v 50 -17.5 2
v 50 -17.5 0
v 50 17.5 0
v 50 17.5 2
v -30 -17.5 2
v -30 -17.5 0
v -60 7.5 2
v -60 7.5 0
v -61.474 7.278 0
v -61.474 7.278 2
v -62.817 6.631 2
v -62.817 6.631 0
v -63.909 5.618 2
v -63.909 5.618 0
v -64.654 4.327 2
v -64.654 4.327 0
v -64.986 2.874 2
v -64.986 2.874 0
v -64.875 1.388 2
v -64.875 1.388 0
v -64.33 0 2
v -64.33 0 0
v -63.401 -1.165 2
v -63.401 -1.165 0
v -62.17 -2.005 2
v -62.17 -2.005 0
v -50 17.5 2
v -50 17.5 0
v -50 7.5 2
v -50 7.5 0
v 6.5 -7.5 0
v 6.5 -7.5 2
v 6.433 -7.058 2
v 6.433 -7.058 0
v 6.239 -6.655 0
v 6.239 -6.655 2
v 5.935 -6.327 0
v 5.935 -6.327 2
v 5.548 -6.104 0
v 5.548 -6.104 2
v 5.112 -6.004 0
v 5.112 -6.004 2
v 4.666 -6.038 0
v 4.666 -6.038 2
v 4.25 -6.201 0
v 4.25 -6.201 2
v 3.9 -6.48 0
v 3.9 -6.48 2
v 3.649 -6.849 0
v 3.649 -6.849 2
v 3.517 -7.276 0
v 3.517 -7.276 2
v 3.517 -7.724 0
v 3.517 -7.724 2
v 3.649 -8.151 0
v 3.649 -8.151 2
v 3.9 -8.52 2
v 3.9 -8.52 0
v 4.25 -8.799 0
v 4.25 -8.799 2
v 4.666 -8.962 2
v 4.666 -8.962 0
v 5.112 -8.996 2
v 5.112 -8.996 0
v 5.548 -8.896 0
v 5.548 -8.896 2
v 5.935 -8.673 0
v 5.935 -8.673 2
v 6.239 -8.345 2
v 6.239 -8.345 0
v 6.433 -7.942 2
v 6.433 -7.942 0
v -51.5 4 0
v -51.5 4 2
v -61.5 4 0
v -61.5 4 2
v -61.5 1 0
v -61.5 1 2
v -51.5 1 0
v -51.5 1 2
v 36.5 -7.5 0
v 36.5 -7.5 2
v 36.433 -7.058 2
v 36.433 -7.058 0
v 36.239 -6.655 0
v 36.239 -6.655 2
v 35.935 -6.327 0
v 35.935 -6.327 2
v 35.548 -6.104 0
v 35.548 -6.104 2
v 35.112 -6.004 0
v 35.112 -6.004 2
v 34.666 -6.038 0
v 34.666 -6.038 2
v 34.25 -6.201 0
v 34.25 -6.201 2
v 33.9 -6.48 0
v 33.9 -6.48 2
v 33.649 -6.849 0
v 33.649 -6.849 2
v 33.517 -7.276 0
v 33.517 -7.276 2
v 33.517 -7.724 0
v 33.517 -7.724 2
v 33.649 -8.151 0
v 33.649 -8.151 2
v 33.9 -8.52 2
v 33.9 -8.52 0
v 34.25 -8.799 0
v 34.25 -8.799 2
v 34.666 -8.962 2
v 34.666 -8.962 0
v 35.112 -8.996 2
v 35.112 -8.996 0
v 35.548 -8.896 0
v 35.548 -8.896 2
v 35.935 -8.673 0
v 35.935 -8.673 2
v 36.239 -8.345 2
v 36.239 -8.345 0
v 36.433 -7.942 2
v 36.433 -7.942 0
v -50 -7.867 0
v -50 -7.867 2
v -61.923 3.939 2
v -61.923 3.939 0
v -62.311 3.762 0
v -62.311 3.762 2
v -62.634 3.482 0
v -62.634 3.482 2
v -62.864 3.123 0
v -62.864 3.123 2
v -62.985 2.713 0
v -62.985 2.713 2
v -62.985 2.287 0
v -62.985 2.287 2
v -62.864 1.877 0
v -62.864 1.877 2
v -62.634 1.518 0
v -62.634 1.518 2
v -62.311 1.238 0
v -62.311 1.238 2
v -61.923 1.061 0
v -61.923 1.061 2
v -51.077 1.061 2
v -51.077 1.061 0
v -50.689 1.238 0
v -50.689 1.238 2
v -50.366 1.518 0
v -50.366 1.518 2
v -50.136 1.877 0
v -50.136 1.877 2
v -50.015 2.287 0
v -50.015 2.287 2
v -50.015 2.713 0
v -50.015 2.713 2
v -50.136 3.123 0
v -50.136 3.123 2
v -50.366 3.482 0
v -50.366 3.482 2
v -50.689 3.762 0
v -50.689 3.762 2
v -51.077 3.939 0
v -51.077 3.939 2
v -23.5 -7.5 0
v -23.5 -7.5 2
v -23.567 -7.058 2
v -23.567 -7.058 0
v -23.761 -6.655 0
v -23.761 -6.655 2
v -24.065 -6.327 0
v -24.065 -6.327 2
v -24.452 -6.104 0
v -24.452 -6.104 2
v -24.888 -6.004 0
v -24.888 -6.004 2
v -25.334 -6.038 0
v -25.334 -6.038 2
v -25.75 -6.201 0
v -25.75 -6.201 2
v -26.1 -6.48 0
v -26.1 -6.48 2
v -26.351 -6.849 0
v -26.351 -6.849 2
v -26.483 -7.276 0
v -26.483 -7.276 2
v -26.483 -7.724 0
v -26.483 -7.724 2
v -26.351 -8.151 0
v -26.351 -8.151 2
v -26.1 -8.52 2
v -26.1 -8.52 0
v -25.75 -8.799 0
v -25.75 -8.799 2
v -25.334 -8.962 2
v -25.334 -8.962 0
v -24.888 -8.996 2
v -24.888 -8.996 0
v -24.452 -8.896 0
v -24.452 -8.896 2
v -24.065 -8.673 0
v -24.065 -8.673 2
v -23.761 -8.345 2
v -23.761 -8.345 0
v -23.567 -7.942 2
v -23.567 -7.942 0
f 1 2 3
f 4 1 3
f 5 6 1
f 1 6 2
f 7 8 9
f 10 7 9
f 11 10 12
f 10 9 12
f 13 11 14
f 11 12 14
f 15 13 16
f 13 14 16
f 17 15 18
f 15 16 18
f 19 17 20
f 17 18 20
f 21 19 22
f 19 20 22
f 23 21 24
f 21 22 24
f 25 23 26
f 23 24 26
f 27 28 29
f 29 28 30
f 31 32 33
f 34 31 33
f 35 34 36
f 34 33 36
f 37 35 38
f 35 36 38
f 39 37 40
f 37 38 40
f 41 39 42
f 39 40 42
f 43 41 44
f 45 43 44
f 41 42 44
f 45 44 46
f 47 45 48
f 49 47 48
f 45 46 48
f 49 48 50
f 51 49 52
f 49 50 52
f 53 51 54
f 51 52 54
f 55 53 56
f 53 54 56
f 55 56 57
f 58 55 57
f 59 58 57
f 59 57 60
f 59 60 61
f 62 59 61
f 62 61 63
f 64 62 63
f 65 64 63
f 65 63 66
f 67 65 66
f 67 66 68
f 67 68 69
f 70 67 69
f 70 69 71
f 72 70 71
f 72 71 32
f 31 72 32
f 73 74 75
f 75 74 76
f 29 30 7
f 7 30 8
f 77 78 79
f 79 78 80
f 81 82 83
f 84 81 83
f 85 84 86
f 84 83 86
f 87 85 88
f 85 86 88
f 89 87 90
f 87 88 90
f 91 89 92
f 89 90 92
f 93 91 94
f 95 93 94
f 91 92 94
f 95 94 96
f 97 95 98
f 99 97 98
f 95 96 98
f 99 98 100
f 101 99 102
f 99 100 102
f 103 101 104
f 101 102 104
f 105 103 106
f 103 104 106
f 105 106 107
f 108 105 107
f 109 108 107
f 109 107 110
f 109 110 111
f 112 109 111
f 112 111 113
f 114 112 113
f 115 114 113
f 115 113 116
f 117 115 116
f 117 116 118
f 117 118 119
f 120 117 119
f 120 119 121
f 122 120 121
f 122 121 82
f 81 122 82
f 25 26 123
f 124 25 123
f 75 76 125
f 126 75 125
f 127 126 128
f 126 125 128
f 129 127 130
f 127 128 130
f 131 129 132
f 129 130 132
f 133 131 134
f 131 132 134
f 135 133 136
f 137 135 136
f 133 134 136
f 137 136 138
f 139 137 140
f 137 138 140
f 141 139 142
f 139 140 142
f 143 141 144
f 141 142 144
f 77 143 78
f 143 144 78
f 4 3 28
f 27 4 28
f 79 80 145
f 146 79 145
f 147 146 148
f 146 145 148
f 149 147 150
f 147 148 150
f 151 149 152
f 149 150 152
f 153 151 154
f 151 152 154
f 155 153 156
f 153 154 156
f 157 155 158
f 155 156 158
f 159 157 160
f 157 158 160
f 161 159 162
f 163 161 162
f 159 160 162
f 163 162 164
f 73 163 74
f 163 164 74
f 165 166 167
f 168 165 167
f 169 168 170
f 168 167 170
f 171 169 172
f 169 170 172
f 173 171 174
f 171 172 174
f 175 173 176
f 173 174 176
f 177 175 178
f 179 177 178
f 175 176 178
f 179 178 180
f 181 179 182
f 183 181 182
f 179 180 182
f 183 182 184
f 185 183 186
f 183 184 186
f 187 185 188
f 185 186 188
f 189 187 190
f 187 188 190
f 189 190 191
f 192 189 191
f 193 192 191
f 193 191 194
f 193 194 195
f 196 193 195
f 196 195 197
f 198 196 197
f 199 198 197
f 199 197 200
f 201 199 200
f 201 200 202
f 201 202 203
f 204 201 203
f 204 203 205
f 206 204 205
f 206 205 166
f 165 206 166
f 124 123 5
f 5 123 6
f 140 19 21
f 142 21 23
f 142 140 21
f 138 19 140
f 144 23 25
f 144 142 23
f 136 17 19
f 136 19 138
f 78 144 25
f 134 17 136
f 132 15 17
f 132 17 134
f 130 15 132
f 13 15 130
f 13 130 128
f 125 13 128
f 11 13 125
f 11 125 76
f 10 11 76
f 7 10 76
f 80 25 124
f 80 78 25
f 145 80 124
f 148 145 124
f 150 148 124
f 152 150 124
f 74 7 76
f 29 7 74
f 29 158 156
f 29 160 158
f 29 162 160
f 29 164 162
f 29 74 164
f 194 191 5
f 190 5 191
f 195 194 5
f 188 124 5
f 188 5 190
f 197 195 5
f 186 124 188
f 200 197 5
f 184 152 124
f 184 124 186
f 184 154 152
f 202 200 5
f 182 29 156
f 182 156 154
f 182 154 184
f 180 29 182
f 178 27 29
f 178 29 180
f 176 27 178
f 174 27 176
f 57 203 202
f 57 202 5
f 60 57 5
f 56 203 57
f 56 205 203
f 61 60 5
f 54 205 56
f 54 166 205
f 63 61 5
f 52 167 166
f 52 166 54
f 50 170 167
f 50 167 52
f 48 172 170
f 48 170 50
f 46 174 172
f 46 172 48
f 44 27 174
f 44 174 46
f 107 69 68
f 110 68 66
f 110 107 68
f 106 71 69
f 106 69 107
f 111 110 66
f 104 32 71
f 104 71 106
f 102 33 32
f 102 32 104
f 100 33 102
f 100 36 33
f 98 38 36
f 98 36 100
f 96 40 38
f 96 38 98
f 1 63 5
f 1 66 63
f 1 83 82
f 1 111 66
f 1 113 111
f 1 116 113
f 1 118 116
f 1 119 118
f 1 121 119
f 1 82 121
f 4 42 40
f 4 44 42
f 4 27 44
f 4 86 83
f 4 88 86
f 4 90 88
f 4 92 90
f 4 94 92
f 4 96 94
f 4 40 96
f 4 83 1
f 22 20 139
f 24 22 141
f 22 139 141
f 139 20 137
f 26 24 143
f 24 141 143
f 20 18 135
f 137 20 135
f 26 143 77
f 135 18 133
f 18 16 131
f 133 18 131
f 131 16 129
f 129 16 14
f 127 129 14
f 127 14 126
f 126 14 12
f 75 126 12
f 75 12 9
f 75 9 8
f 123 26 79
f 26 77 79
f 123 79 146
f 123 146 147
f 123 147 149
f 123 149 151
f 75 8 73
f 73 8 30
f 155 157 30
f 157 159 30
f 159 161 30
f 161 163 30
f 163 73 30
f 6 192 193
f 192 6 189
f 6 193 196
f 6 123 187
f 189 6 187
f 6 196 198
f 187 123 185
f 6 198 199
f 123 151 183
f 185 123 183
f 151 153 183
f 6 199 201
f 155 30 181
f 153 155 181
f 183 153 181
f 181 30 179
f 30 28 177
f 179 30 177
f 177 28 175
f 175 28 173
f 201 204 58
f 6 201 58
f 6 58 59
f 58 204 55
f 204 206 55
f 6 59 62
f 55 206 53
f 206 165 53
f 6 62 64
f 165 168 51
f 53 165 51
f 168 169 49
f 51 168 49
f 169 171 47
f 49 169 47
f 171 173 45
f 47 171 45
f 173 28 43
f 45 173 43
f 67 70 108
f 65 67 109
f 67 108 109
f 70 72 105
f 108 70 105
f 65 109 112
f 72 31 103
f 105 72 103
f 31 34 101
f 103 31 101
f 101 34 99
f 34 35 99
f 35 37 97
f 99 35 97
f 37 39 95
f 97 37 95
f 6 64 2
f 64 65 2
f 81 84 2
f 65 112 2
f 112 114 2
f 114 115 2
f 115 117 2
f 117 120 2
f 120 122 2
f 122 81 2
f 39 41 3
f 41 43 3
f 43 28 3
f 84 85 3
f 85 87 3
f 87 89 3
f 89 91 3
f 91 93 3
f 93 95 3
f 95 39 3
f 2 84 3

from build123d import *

# Parameters (mm, degrees)
AUFSATZ_LINEAR_AUSTRAGEN1_DEPTH = 2
SKIZZE2_R                       = 1.5
SCHNITT_LINEAR_AUSTRAGEN1_DEPTH = 68.344264789


with BuildPart() as part:
    # Skizze1 → Aufsatz-Linear austragen1 (new body)
    with BuildSketch(Plane.XY):
        Polygon((-50, 17.5), (-50, 7.5), (-50, -2.5), (-50, -7.866530531), (-30, -17.5), (50, -17.5), (50, 17.5), align=None)
        with BuildLine():
            Line((-50, -2.5), (-50, 7.5))
            Line((-50, 7.5), (-60, 7.5))
            ThreePointArc((-60, 7.5), (-56.464466094, 6.035533906), (-55, 2.5))
            ThreePointArc((-55, 2.5), (-56.464466094, -1.035533906), (-60, -2.5))
            Line((-60, -2.5), (-50, -2.5))
        make_face()
        with BuildLine():
            ThreePointArc((-55, 2.5), (-56.464466094, 6.035533906), (-60, 7.5))
            Line((-60, 7.5), (-60, -2.5))
            ThreePointArc((-60, -2.5), (-56.464466094, -1.035533906), (-55, 2.5))
        make_face()
        with BuildLine():
            Line((-60, -2.5), (-60, 7.5))
            ThreePointArc((-60, 7.5), (-64.874594918, 3.612800243), (-62.169780165, -2.004670247))
            ThreePointArc((-62.169780165, -2.004670247), (-61.112800243, -2.374594918), (-60, -2.5))
        make_face()
        with BuildLine():
            Line((-50, -7.866530531), (-50, -2.5))
            Line((-50, -2.5), (-60, -2.5))
            ThreePointArc((-60, -2.5), (-61.112800243, -2.374594918), (-62.169780165, -2.004670247))
            Line((-62.169780165, -2.004670247), (-50, -7.866530531))
        make_face()
    extrude(amount=AUFSATZ_LINEAR_AUSTRAGEN1_DEPTH)

    # Skizze2 → Schnitt-Linear austragen1 (cut, through all)
    with BuildSketch(Plane.XY.offset(2)):
        with Locations((-51.5, 2.5)):
            Circle(SKIZZE2_R)
        with BuildLine():
            Line((-51.5, 4), (-61.5, 4))
            ThreePointArc((-61.5, 4), (-60.439339828, 3.560660172), (-60, 2.5))
            ThreePointArc((-60, 2.5), (-60.439339828, 1.439339828), (-61.5, 1))
            Line((-61.5, 1), (-51.5, 1))
            ThreePointArc((-51.5, 1), (-53, 2.5), (-51.5, 4))
        make_face()
        with Locations((-61.5, 2.5)):
            Circle(SKIZZE2_R)
        with Locations((-25, -7.5)):
            Circle(SKIZZE2_R)
        with Locations((35, -7.5)):
            Circle(SKIZZE2_R)
        with Locations((5, -7.5)):
            Circle(SKIZZE2_R)
    extrude(amount=-SCHNITT_LINEAR_AUSTRAGEN1_DEPTH, mode=Mode.SUBTRACT)


solid = part.part
